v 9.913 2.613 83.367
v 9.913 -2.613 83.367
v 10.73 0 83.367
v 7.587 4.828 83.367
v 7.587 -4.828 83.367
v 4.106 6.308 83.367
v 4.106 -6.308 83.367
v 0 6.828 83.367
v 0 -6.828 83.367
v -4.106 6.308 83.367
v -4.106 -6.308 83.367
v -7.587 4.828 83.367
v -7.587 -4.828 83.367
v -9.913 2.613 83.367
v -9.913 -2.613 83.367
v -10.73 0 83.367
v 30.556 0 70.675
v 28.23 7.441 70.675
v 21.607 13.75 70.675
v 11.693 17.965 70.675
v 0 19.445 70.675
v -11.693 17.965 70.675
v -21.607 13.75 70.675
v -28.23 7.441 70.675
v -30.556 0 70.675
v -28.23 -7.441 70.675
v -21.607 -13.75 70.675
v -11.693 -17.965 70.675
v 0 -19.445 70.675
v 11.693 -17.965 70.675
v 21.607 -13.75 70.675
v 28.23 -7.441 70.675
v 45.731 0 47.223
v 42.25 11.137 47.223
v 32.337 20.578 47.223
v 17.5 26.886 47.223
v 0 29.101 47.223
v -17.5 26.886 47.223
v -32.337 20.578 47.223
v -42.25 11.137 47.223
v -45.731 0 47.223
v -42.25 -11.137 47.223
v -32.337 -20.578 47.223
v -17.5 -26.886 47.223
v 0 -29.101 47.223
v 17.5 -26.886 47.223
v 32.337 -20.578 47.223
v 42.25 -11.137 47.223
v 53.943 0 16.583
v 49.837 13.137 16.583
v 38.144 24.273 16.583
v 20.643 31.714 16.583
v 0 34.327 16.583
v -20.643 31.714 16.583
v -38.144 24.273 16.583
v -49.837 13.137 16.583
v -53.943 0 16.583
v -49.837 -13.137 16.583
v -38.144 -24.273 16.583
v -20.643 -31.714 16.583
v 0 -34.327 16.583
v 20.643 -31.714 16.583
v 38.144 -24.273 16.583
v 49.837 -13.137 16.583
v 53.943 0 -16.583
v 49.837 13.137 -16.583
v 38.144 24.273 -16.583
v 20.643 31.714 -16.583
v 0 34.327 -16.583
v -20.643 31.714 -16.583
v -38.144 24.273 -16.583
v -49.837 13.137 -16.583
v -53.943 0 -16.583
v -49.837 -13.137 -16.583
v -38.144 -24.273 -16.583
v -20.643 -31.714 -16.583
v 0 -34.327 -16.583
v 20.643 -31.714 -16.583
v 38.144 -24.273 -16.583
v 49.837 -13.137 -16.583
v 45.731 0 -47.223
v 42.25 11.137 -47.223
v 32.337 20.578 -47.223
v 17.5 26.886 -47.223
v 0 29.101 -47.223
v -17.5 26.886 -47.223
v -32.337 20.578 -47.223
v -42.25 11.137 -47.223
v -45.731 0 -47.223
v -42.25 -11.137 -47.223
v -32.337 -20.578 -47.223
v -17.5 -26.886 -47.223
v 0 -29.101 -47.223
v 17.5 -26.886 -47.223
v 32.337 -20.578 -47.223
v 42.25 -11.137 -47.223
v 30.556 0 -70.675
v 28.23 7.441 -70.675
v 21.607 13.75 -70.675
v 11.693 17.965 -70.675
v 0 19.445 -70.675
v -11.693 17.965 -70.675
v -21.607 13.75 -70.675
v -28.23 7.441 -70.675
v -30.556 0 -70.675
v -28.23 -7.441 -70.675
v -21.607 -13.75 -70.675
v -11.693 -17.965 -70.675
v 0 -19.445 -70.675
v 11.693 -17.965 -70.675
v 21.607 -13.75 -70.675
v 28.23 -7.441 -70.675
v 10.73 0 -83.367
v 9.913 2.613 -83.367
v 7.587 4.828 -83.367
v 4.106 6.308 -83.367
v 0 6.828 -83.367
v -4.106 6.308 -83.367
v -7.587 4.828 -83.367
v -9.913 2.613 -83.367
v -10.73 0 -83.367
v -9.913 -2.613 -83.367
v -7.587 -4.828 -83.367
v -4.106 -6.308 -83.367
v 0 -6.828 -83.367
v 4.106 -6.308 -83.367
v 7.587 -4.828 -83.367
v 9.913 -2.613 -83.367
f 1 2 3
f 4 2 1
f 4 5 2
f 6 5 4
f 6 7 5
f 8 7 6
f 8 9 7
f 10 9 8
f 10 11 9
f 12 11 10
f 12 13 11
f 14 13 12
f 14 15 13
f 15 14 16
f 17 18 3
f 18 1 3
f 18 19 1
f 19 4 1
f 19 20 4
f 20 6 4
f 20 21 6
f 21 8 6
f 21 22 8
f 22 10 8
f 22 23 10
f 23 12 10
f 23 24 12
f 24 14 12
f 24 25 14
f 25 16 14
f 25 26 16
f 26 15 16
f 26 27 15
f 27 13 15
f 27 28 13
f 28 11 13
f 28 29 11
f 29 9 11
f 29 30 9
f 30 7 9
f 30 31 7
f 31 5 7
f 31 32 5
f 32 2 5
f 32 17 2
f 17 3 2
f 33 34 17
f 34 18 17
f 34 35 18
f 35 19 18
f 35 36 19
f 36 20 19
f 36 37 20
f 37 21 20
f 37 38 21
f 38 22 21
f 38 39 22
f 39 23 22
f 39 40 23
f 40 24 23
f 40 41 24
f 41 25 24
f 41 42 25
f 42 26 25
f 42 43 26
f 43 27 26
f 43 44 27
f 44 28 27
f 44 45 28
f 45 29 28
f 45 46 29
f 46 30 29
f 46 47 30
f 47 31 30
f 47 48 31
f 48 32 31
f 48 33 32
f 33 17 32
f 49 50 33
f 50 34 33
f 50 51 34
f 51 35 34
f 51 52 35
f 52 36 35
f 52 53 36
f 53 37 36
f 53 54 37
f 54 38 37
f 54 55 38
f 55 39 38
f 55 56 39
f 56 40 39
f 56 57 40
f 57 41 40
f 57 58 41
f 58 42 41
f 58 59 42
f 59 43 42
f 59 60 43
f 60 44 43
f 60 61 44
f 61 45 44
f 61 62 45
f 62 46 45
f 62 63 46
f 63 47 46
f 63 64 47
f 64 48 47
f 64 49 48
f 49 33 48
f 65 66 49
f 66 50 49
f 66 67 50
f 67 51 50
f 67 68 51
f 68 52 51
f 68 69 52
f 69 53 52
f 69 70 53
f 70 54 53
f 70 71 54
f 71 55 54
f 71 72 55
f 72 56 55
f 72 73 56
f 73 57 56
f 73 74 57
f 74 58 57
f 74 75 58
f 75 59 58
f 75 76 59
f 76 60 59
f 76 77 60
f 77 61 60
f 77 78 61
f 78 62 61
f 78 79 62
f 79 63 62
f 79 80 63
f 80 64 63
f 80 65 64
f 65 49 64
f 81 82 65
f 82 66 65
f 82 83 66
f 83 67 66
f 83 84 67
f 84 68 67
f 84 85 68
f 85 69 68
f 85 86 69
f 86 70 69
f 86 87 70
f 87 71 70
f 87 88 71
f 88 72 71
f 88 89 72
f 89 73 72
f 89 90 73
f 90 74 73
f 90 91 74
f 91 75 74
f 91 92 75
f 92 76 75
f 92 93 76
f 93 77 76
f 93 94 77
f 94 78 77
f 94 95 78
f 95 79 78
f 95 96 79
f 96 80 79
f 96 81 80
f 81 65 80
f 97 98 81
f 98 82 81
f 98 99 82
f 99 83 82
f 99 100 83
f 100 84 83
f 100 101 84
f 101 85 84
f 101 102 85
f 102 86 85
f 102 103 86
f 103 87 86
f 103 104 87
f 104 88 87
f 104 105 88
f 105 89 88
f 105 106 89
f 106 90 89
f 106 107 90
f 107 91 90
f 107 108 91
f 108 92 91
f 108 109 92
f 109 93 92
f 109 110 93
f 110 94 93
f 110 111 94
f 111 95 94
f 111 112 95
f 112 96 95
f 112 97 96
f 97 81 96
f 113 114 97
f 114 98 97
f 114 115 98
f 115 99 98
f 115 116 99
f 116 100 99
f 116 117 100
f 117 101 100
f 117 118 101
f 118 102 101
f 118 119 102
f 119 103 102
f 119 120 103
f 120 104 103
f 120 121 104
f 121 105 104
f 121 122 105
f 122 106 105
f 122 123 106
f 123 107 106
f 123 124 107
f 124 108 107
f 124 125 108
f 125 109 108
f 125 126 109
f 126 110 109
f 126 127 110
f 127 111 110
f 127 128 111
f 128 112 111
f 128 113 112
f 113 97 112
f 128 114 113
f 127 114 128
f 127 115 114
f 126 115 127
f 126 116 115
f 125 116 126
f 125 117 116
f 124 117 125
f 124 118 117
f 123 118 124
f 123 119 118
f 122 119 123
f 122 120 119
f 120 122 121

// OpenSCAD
// Generated by SolidPython 1.0.1 on 2020-07-29 00:46:49


scale(v = [11, 7, 17]) {
	sphere(r = 5);
}
/***********************************************
*********      SolidPython code:      **********
************************************************
 
# import packages: SolidPython
from solid import *
from solid.utils import *
from itertools import chain, combinations, permutations


class Resize:

    def __init__(self, scad_file):
        self.scad_file = scad_file
        #self.scad_file = import_scad(scad_file)
        # cone/cylinder param:
        self.r1 = 0
        self.r2 = 0
        self.h = 0
        # rectangular prism param:
        self.w = 0
        self.l = 0
        # ellipse param:
        self.r = 0

    # import OpenScad code (file name corresponds to shape)


    # classify shape + parameters
    def assign(self, param1, param2, param3):
        if self.scad_file == 'cone.scad':
            self.r1 = param1
            self.r2 = param2
            self.h = param3
        elif self.scad_file == 'cylinder.scad':
            self.r1 = param1
            self.r2 = param2
            self.h = param3
        elif self.scad_file == 'rectangularPrism.scad':
            self.h = param1
            self.l = param2
            self.w = param3
        else:
            self.r = param1
            self.h = param2

    # resize parameters
    def iterate(self):
        x = range(3, 20, 2)
        i = 1
        if self.scad_file == 'cone.scad':
            tempList = list(permutations(x, 2))
            for temp in tempList:
                param1 = temp[0]
                param2 = temp[1]
                filepath = 'produced_scad_files/' + 'cone' + str(param1) + '_' + str(param2) + '_' + '.scad'
                scad_render_to_file(cylinder(h=param1, r1=param2, r2=0), filepath)

        elif self.scad_file == 'cylinder.scad':
            tempList = list(permutations(x, 3))
            for temp in tempList:
                param1 = temp[0]
                param2 = temp[1]
                filepath = 'produced_scad_files/' + 'cylinder' + str(param1) + '_' + str(param2) + '_' + '.scad'
                scad_render_to_file(cylinder(h=param1, r1=param2, r2=param2), filepath)

        elif self.scad_file == 'rectangularPrism.scad':
            tempList = list(permutations(x, 3))
            for temp in tempList:
                param1 = temp[0]
                param2 = temp[1]
                param3 = temp[2]
                filepath = 'produced_scad_files/' + 'rectangularPrism' + str(param1) + '_' + str(param2) + '_' + str(
                    param3) + '.scad'
                scad_render_to_file(cube(size=(param1, param2, param3)), filepath)

        elif self.scad_file == 'ellipse.scad':
            tempList = list(permutations(x, 4))
            for temp in tempList:
                param1 = temp[0]
                param2 = temp[1]
                param3 = temp[2]
                param4 = temp[3]
                filepath = 'produced_scad_files/' + 'ellipse' + str(param1) + '_' + str(param2) + '_' + str(param3) + '_' + str(param4) + '.scad'
                scad_render_to_file(scale([param1, param2, param3])(sphere(r=param4)), filepath)

    def render_to_scadfile(self):
        scad_render_to_file(scad, 'example.scad') 
 
************************************************/
